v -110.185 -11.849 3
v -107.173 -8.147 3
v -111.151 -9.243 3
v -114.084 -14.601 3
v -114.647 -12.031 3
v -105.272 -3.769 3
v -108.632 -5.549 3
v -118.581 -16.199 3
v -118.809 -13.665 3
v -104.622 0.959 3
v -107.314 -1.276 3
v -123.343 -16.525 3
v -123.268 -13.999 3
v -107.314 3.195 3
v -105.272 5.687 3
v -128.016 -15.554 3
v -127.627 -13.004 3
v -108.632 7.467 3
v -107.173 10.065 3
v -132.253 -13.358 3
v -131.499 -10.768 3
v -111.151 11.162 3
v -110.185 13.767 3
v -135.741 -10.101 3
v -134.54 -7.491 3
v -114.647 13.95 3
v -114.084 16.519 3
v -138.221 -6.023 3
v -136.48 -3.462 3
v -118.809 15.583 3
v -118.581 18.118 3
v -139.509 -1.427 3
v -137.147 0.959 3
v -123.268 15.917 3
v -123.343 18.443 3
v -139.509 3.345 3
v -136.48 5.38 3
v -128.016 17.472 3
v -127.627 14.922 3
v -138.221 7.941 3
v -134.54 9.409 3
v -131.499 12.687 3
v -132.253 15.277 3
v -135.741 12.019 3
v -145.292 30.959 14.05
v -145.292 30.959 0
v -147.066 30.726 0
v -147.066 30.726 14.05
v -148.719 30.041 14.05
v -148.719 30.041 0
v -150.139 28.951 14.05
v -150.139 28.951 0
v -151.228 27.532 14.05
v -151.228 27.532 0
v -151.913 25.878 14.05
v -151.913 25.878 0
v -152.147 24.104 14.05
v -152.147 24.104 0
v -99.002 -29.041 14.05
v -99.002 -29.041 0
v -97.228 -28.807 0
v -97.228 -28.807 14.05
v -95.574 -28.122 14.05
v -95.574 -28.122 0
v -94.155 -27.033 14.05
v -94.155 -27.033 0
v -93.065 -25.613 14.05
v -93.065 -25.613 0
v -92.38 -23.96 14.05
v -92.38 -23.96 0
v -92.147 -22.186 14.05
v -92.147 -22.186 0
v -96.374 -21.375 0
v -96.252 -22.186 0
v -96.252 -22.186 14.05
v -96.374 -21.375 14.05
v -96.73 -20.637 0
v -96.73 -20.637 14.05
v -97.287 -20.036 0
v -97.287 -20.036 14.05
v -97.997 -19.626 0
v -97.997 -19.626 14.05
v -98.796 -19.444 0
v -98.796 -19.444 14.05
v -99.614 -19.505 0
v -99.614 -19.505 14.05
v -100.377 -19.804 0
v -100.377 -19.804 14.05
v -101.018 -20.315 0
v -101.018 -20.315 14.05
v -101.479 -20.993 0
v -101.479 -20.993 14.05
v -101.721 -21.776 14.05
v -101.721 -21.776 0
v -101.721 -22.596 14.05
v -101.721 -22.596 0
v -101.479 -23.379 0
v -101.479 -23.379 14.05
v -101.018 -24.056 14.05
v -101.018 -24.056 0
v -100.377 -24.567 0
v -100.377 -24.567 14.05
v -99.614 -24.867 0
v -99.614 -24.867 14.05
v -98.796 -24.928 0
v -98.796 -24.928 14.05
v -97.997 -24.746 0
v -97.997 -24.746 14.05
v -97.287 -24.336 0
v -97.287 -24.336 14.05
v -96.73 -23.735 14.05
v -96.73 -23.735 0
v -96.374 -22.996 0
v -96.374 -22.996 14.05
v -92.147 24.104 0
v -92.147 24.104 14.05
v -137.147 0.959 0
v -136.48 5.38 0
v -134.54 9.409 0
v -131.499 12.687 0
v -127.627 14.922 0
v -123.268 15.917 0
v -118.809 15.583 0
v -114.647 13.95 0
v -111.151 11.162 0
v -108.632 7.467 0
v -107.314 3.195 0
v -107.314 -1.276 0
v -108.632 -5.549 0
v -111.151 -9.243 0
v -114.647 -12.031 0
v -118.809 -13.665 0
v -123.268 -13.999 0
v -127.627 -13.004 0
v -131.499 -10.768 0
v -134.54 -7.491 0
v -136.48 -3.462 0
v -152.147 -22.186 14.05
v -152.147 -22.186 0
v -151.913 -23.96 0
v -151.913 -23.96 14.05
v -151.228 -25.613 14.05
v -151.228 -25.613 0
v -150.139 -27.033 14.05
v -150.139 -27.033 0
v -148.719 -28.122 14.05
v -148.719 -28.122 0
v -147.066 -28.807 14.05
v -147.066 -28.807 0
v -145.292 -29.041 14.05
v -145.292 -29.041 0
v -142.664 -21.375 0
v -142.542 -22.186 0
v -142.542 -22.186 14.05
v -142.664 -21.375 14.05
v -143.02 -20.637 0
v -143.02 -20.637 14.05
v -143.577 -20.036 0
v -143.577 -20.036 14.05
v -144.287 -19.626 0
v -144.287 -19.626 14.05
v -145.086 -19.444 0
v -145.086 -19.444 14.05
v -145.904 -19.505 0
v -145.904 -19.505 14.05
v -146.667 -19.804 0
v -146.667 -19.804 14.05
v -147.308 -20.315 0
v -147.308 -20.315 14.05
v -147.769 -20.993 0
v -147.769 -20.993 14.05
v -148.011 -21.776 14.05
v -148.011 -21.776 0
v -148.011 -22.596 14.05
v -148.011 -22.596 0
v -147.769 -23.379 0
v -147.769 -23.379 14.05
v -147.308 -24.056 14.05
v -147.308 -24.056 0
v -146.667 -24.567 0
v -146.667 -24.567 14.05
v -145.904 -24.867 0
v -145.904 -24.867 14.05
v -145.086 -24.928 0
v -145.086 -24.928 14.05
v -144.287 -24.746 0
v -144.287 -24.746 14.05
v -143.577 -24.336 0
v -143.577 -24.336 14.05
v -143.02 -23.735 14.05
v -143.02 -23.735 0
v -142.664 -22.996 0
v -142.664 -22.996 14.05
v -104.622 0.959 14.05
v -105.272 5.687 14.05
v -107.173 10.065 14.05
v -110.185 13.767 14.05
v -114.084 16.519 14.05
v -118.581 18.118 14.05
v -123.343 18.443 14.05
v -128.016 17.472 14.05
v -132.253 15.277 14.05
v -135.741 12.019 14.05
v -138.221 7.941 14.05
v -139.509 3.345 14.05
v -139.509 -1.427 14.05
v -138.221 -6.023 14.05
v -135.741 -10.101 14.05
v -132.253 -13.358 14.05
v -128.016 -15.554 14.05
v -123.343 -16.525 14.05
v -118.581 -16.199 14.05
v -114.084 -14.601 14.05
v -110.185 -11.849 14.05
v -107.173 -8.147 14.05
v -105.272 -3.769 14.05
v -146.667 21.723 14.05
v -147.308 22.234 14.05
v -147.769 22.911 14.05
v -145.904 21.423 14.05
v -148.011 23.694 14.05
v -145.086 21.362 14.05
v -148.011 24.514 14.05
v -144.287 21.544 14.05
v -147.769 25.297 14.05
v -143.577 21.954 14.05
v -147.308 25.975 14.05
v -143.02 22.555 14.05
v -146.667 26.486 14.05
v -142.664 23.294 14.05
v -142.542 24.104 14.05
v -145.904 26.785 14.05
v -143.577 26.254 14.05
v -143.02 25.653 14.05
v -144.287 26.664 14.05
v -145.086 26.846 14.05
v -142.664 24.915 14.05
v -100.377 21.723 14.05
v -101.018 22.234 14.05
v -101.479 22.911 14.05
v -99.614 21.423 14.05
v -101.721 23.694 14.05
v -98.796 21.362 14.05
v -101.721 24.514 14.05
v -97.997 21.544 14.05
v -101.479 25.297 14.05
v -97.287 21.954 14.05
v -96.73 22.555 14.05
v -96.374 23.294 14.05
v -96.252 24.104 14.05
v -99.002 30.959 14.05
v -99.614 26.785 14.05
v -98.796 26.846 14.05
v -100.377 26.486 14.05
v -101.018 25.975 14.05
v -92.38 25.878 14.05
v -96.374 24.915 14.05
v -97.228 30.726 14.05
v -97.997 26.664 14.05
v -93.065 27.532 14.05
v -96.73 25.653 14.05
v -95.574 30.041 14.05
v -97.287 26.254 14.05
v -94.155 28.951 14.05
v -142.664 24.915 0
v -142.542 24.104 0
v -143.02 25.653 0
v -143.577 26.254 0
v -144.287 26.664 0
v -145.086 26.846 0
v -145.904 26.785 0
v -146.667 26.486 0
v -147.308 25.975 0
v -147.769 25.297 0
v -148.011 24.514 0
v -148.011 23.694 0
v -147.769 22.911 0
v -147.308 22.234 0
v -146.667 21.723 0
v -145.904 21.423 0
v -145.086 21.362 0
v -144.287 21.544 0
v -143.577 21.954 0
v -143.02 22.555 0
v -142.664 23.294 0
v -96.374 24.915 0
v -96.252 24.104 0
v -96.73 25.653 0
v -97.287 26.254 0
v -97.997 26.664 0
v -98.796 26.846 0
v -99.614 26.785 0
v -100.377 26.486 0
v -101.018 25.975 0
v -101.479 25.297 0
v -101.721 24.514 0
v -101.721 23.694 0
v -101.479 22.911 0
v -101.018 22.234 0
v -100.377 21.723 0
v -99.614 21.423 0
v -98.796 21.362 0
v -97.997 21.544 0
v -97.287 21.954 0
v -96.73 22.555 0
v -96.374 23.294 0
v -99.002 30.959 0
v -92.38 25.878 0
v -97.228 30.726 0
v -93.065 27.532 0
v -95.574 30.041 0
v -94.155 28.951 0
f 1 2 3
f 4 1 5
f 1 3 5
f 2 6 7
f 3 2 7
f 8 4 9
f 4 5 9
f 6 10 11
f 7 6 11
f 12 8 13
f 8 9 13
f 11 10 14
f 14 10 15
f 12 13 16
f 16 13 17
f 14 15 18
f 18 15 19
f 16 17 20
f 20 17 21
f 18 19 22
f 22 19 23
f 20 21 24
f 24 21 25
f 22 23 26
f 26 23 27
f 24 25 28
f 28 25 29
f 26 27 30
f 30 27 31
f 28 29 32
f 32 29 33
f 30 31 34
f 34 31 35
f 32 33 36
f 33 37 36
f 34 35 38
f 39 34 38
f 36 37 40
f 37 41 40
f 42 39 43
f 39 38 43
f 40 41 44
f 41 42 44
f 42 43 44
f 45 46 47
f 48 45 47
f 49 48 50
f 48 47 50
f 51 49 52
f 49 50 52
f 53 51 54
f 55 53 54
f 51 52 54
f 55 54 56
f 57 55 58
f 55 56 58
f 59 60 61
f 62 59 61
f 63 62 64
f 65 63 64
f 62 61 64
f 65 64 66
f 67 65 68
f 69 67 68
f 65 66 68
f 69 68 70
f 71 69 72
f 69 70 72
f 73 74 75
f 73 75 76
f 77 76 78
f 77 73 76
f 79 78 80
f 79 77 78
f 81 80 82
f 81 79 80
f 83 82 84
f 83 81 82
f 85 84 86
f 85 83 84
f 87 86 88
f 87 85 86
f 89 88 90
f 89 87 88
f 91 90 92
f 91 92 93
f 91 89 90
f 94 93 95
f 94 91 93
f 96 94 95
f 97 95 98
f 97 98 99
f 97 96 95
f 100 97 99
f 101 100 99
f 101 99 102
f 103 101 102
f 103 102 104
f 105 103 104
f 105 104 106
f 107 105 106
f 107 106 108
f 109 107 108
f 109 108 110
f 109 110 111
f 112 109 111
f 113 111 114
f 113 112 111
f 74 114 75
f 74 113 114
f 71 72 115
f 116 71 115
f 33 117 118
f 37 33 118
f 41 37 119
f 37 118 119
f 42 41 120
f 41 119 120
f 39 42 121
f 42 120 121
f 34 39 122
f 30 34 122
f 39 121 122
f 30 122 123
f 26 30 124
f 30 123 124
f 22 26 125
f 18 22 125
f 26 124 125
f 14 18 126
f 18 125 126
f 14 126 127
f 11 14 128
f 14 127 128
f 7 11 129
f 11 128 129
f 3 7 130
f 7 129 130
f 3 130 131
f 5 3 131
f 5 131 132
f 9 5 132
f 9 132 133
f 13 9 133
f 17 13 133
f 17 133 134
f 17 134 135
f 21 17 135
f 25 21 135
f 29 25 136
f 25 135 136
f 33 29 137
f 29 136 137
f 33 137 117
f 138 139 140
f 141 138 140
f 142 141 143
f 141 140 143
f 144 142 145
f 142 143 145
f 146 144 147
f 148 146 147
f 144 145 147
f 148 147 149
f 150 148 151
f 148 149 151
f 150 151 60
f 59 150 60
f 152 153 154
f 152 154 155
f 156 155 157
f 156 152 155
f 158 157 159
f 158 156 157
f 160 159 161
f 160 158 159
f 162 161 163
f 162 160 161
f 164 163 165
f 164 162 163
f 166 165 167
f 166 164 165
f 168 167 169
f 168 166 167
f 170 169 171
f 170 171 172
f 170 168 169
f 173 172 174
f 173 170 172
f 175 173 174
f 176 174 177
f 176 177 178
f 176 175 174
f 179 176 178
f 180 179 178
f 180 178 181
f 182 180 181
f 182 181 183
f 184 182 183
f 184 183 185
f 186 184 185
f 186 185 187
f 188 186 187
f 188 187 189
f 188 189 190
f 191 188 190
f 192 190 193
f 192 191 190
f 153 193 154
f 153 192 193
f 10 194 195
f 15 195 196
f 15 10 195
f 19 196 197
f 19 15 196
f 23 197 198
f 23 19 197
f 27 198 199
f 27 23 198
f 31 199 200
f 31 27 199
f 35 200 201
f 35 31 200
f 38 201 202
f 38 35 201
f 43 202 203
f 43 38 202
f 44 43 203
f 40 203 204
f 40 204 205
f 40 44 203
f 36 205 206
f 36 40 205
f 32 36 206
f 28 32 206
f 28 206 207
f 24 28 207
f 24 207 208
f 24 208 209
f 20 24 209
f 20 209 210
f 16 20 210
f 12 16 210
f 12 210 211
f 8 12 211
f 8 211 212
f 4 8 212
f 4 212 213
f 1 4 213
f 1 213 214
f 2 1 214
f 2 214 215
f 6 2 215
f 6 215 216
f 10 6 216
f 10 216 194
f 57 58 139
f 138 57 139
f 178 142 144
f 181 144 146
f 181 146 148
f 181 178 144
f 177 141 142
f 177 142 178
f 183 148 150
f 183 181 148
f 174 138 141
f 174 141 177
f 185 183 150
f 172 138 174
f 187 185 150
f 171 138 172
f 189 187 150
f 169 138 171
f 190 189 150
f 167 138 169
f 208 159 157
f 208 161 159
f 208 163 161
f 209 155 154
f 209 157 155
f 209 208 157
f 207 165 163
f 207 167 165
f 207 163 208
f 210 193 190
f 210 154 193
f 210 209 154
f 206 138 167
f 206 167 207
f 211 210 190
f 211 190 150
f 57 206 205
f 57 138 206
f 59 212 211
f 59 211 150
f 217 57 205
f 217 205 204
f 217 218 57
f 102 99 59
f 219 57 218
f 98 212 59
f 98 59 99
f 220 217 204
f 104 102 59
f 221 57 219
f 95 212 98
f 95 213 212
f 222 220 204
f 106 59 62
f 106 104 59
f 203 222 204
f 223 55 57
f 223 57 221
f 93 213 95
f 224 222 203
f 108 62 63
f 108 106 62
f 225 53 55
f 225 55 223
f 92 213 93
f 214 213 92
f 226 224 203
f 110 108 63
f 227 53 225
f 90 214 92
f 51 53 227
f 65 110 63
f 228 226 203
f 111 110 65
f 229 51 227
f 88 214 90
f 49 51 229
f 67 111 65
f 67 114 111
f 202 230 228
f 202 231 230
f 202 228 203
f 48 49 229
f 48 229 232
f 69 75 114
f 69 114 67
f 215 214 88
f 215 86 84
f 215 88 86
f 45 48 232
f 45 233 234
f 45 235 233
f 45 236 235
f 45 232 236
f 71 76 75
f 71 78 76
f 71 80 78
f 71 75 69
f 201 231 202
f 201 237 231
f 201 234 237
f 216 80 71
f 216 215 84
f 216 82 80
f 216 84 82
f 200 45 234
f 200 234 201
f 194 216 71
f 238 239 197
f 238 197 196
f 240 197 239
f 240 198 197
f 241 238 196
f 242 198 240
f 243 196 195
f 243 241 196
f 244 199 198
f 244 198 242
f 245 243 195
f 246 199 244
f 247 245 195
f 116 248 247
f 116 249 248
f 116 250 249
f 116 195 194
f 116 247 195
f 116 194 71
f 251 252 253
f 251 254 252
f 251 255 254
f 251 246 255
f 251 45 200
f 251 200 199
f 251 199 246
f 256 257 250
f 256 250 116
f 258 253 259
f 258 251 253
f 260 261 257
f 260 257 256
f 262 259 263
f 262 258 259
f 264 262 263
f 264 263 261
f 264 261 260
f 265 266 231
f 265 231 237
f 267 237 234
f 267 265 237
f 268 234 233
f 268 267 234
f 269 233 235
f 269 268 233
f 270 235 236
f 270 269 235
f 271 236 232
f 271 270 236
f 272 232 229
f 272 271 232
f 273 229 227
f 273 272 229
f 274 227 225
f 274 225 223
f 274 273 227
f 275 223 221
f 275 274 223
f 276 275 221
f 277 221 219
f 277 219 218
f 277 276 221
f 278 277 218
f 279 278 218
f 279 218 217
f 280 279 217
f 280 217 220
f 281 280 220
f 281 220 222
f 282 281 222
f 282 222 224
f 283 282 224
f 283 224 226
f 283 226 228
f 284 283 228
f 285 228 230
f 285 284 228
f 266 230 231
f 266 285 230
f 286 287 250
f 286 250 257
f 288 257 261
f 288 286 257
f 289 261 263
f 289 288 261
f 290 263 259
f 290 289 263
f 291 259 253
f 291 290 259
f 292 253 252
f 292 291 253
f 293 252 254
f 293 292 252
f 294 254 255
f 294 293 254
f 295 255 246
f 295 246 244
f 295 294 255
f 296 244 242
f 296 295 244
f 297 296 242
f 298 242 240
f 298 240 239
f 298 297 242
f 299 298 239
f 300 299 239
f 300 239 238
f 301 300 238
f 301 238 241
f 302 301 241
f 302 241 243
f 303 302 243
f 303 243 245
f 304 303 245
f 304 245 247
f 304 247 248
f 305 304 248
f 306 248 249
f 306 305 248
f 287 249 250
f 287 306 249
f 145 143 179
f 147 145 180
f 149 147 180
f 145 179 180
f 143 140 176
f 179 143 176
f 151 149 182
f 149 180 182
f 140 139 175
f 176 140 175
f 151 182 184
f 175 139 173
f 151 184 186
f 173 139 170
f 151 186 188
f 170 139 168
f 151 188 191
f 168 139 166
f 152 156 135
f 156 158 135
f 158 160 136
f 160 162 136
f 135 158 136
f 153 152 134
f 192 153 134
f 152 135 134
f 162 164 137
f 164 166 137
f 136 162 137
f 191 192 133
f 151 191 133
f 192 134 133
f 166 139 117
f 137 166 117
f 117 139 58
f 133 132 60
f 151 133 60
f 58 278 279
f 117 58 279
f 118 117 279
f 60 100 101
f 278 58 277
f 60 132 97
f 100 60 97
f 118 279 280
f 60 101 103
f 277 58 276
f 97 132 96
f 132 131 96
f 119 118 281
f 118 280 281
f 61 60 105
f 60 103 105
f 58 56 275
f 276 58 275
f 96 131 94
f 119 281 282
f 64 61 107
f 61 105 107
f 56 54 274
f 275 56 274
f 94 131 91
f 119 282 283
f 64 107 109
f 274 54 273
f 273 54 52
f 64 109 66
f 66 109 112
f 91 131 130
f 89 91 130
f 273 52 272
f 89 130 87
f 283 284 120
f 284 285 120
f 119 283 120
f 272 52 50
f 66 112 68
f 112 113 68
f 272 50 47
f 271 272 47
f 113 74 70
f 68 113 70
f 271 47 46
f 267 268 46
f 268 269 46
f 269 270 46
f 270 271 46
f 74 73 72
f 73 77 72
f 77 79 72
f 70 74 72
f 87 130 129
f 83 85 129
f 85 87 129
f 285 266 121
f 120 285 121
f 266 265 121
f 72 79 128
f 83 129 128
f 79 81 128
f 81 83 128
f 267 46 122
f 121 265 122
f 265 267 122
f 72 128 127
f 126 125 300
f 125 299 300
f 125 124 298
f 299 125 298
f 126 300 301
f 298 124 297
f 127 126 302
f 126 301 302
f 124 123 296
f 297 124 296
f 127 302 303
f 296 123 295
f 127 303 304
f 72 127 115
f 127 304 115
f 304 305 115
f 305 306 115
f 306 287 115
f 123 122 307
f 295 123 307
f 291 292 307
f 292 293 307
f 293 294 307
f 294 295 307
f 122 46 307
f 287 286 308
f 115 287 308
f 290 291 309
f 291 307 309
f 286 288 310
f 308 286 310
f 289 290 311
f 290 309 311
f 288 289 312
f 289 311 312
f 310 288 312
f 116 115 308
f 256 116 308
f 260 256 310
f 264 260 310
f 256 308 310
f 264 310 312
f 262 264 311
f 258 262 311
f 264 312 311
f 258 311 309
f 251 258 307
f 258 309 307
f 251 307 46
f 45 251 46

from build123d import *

# Parameters (mm, degrees)
CROQUIS1_R              = 2.75
CROQUIS1_R_2            = 17.525
SALIENTE_EXTRUIR1_DEPTH = 14.05
CROQUIS3_R              = 20
CROQUIS3_R_2            = 15
SALIENTE_EXTRUIR2_DEPTH = 3


with BuildPart() as part:
    # Croquis1 → Saliente-Extruir1 (new body)
    with BuildSketch(Plane.XY):
        with BuildLine():
            Line((-99.001786664, 30.959159172), (-145.291786664, 30.959159172))
            ThreePointArc((-145.291786664, 30.959159172), (-150.139003649, 28.951376157), (-152.146786664, 24.104159172))
            Line((-152.146786664, 24.104159172), (-152.146786664, -22.185840828))
            ThreePointArc((-152.146786664, -22.185840828), (-150.139003649, -27.033057813), (-145.291786664, -29.040840828))
            Line((-145.291786664, -29.040840828), (-99.001786664, -29.040840828))
            ThreePointArc((-99.001786664, -29.040840828), (-94.154569679, -27.033057813), (-92.146786664, -22.185840828))
            Line((-92.146786664, -22.185840828), (-92.146786664, 24.104159172))
            ThreePointArc((-92.146786664, 24.104159172), (-94.154569679, 28.951376157), (-99.001786664, 30.959159172))
        make_face()
        with Locations((-145.291786664, 24.104159172)):
            Circle(CROQUIS1_R, mode=Mode.SUBTRACT)
        with Locations((-145.291786664, -22.185840828)):
            Circle(CROQUIS1_R, mode=Mode.SUBTRACT)
        with Locations((-99.001786664, -22.185840828)):
            Circle(CROQUIS1_R, mode=Mode.SUBTRACT)
        with Locations((-99.001786664, 24.104159172)):
            Circle(CROQUIS1_R, mode=Mode.SUBTRACT)
        with Locations((-122.146786664, 0.959159172)):
            Circle(CROQUIS1_R_2, mode=Mode.SUBTRACT)
    extrude(amount=SALIENTE_EXTRUIR1_DEPTH)

    # Croquis3 → Saliente-Extruir2 (add)
    with BuildSketch(Plane(origin=(0, 0, 0), x_dir=(-1, 0, 0), z_dir=(0, 0, -1))):
        with Locations((122.146786664, 0.959159172)):
            Circle(CROQUIS3_R)
        with Locations((122.146786664, 0.959159172)):
            Circle(CROQUIS3_R_2, mode=Mode.SUBTRACT)
    extrude(amount=-SALIENTE_EXTRUIR2_DEPTH)


solid = part.part
